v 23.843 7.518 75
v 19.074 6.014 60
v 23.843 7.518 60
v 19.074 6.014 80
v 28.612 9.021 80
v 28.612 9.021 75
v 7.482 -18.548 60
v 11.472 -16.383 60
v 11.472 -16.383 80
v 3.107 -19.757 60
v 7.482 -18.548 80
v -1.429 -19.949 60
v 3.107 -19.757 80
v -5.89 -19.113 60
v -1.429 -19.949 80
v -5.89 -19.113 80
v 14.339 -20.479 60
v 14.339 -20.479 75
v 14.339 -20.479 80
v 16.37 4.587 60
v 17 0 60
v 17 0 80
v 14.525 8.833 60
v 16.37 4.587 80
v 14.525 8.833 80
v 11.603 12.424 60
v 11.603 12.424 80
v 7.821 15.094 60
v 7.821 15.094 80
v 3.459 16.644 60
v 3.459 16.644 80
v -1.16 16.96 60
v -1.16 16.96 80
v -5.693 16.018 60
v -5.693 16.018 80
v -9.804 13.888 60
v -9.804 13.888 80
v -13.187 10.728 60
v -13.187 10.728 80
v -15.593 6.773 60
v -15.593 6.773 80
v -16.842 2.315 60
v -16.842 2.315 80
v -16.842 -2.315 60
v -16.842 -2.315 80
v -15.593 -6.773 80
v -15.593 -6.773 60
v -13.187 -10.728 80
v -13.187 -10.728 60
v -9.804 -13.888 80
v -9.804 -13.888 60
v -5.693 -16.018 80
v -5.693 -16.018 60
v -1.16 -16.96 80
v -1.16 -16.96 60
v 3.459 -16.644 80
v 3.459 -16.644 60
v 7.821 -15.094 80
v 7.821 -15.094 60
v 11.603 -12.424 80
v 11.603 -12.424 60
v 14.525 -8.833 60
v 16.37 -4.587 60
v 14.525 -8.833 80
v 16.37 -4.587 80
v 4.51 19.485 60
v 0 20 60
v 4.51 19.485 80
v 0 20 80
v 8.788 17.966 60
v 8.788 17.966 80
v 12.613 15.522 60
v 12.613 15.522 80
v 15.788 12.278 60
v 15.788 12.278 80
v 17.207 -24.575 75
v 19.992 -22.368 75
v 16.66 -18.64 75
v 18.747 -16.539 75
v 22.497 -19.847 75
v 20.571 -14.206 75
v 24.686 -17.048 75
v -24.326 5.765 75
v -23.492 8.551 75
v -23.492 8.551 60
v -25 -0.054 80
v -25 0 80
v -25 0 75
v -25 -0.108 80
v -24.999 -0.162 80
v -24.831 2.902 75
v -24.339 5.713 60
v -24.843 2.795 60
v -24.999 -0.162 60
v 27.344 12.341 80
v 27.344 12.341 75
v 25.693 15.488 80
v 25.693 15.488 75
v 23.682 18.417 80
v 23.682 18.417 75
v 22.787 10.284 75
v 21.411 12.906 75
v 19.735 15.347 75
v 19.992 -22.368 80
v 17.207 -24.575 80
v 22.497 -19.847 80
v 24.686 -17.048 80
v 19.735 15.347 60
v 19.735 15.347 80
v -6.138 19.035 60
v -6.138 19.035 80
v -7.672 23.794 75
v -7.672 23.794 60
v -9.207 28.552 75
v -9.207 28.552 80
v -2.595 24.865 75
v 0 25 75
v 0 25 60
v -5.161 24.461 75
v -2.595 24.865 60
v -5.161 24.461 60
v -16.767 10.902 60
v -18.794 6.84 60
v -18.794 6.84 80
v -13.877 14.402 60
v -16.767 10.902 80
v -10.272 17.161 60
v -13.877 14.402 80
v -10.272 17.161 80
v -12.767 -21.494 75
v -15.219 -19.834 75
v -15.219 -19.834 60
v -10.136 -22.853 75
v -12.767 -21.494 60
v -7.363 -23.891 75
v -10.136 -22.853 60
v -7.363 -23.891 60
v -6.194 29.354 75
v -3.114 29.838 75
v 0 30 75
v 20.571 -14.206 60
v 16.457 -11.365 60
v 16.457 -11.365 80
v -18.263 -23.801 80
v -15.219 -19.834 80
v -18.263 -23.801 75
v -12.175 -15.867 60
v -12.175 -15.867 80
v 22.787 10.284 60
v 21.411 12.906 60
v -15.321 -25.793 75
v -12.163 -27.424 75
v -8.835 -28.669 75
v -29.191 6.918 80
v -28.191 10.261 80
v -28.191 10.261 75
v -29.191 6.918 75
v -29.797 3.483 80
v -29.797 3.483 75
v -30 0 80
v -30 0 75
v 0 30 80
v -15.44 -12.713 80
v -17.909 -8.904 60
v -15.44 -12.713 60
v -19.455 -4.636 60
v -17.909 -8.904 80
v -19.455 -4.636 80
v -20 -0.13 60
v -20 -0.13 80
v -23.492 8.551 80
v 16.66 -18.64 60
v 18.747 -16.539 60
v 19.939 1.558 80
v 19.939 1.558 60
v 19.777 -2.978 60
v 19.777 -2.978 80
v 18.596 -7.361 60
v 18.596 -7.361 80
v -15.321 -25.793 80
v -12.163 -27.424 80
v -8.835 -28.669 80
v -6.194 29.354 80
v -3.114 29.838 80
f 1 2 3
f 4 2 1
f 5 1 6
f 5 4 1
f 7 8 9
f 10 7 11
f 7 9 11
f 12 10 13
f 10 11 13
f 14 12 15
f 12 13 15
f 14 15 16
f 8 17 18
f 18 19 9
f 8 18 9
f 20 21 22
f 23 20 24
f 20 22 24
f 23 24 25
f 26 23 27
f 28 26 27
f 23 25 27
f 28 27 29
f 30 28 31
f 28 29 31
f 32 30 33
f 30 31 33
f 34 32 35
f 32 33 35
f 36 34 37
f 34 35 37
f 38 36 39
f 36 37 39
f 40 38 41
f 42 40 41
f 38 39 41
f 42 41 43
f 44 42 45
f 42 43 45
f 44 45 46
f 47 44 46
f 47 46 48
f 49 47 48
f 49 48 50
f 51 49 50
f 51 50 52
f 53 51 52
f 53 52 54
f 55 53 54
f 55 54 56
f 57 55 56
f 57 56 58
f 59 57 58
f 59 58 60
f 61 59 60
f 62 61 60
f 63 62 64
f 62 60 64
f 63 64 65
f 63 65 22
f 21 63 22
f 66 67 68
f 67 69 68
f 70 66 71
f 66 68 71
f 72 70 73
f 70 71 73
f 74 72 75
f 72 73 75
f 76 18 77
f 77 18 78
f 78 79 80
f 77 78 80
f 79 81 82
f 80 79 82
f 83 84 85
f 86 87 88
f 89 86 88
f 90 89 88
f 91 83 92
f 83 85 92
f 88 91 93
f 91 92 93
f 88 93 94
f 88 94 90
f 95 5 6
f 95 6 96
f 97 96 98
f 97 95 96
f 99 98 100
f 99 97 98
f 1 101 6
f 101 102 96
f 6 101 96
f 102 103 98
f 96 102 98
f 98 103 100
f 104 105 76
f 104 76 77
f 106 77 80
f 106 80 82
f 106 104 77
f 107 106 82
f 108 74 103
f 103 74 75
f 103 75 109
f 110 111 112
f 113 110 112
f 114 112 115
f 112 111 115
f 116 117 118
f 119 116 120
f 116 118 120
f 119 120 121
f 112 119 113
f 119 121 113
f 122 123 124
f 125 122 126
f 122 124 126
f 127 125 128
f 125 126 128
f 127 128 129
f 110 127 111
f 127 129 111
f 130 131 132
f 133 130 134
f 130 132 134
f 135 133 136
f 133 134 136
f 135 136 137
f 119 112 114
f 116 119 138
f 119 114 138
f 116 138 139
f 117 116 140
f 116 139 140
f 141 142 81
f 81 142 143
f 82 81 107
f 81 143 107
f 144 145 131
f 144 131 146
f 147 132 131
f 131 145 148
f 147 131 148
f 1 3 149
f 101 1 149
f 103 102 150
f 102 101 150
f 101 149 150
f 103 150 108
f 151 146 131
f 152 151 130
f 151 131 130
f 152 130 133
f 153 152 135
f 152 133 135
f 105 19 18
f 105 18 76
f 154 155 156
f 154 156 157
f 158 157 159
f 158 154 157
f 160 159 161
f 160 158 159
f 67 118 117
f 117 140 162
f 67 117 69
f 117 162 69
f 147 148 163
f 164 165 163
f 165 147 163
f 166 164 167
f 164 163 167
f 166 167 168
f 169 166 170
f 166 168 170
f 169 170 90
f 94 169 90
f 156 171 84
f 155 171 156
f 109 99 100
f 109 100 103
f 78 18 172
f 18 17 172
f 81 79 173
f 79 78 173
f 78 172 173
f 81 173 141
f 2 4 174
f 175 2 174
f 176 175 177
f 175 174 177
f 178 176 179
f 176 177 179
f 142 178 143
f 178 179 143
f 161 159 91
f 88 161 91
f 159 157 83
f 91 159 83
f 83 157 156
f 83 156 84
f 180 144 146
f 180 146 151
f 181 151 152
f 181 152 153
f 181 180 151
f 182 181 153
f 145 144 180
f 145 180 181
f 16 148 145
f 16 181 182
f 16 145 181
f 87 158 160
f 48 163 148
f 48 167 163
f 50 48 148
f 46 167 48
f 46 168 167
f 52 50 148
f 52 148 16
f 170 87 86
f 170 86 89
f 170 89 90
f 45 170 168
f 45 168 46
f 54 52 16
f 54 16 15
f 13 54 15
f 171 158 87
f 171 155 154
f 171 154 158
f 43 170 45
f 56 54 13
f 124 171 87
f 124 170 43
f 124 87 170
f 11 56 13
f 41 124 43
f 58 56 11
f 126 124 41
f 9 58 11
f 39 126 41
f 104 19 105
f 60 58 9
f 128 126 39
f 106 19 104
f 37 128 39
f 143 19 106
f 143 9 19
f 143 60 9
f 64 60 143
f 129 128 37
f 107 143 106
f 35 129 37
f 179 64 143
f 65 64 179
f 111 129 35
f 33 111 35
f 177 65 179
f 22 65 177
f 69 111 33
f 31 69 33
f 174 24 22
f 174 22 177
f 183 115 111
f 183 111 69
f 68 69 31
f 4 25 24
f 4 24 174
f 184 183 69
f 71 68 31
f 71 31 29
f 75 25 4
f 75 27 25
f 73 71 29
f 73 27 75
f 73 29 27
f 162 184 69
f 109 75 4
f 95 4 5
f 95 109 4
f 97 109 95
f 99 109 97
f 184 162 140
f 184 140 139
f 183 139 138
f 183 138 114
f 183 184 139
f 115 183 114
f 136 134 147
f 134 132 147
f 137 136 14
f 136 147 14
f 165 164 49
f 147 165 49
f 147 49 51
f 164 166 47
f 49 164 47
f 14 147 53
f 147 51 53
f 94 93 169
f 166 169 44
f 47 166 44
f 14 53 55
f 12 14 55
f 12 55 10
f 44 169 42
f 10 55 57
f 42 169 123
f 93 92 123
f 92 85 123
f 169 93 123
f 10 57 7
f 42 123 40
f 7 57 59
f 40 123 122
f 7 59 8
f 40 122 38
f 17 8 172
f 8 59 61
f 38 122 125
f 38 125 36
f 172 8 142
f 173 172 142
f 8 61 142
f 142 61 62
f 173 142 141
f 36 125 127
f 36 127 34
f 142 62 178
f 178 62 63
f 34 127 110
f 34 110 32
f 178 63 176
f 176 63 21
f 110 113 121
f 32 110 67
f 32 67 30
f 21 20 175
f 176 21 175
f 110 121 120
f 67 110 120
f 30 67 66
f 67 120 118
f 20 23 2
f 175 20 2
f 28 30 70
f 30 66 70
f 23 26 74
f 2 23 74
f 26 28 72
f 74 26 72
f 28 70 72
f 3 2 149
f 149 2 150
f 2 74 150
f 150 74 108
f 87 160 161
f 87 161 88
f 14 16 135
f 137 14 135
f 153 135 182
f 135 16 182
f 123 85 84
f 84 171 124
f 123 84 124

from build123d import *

# Parameters (mm, degrees)
F0_R     = 25
F0_R_2   = 15
F1_DEPTH = 80
F3_DEPTH = 80.001
F5_DEPTH = 5
F6_W     = 105.9157028794
F6_H     = 79.6656981111
F7_DEPTH = 60
F8_R     = 17
F9_DEPTH = 20.001


with BuildPart() as f1:
    # F0 (on Top) → F1 (new body)
    with BuildSketch(Plane.XY):
        Circle(F0_R)
        Circle(F0_R_2, mode=Mode.SUBTRACT)
    extrude(amount=F1_DEPTH)

    # F2 (on face) → F3 (cut, through all)
    with BuildSketch(Plane.XY.offset(80)):
        with BuildLine():
            Line((0, 25), (0, 20))
            ThreePointArc((0, 20), (8.7875598508, 17.9660455267), (15.7877700348, 12.2778791869))
            Line((15.7877700348, 12.2778791869), (19.7347125435, 15.3473489836))
            ThreePointArc((19.7347125435, 15.3473489836), (10.9844498135, 22.4575569084), (0, 25))
        make_face()
        with BuildLine():
            Line((-6.1376971007, 19.0349329996), (-7.6721213759, 23.7936662495))
            ThreePointArc((-7.6721213759, 23.7936662495), (-17.3462974082, 18.0029432657), (-23.4923155196, 8.5505035831))
            Line((-23.4923155196, 8.5505035831), (-18.7938524157, 6.8404028665))
            ThreePointArc((-18.7938524157, 6.8404028665), (-13.8770379265, 14.4023546125), (-6.1376971007, 19.0349329996))
        make_face()
        with BuildLine():
            Line((-19.9995793719, -0.1297110174), (-24.9994742148, -0.1621387717))
            ThreePointArc((-24.9994742148, -0.1621387717), (-22.3858443864, -11.1298684228), (-15.2190357252, -19.8338335073))
            Line((-15.2190357252, -19.8338335073), (-12.1752285802, -15.8670668058))
            ThreePointArc((-12.1752285802, -15.8670668058), (-17.9086755091, -8.9038947382), (-19.9995793719, -0.1297110174))
        make_face()
        with BuildLine():
            ThreePointArc((-7.362852386, -23.8911783875), (3.8831909406, -24.6965752306), (14.3394109088, -20.4788011072))
            Line((14.3394109088, -20.4788011072), (11.471528727, -16.3830408858))
            ThreePointArc((11.471528727, -16.3830408858), (3.1065527525, -19.7572601845), (-5.8902819088, -19.11294271))
            Line((-5.8902819088, -19.11294271), (-7.362852386, -23.8911783875))
        make_face()
        with BuildLine():
            ThreePointArc((25, 0), (24.7090377617, 3.8030846547), (23.8429237687, 7.5176449876))
            Line((23.8429237687, 7.5176449876), (19.074339015, 6.0141159901))
            ThreePointArc((19.074339015, 6.0141159901), (19.7769923674, -2.9783507013), (16.4570955105, -11.3650344196))
            Line((16.4570955105, -11.3650344196), (20.5713693881, -14.2062930245))
            ThreePointArc((20.5713693881, -14.2062930245), (23.8671765685, -7.4402878068), (25, 0))
        make_face()
    extrude(amount=-F3_DEPTH, mode=Mode.SUBTRACT)

    # F4 (on face) → F5 (join)
    with BuildSketch(Plane.XY.offset(80)):
        with BuildLine():
            ThreePointArc((19.7347125435, 15.3473489836), (22.1377203615, 11.6155644372), (23.8429237687, 7.5176449876))
            Line((23.8429237687, 7.5176449876), (28.6115085224, 9.0211739851))
            ThreePointArc((28.6115085224, 9.0211739851), (26.5652644339, 13.9386773246), (23.6816550522, 18.4168187804))
            Line((23.6816550522, 18.4168187804), (19.7347125435, 15.3473489836))
        make_face()
        with BuildLine():
            ThreePointArc((-7.6721213759, 23.7936662495), (-3.8831909406, 24.6965752306), (0, 25))
            Line((0, 25), (0, 30))
            ThreePointArc((0, 30), (-4.6598291287, 29.6358902767), (-9.2065456511, 28.5523994994))
            Line((-9.2065456511, 28.5523994994), (-7.6721213759, 23.7936662495))
        make_face()
        with BuildLine():
            ThreePointArc((-25, 0), (-24.6201938253, 4.3412044417), (-23.4923155196, 8.5505035831))
            Line((-23.4923155196, 8.5505035831), (-28.1907786236, 10.2606042998))
            ThreePointArc((-28.1907786236, 10.2606042998), (-29.5442325904, 5.20944533), (-30, 0))
            Line((-30, 0), (-25, 0))
        make_face()
        with BuildLine():
            Line((-8.8354228632, -28.669414065), (-7.362852386, -23.8911783875))
            ThreePointArc((-7.362852386, -23.8911783875), (-11.471744834, -22.2125881082), (-15.2190357252, -19.8338335073))
            Line((-15.2190357252, -19.8338335073), (-18.2628428703, -23.8006002087))
            ThreePointArc((-18.2628428703, -23.8006002087), (-13.7660938008, -26.6551057298), (-8.8354228632, -28.669414065))
        make_face()
        with BuildLine():
            Line((24.6856432657, -17.0475516294), (20.5713693881, -14.2062930245))
            ThreePointArc((20.5713693881, -14.2062930245), (17.7349015968, -17.620251569), (14.3394109088, -20.4788011072))
            Line((14.3394109088, -20.4788011072), (17.2072930905, -24.5745613287))
            ThreePointArc((17.2072930905, -24.5745613287), (21.2818819161, -21.1443018827), (24.6856432657, -17.0475516294))
        make_face()
        with BuildLine():
            Line((-4.6032728256, 14.2761997497), (-6.1376971007, 19.0349329996))
            ThreePointArc((-6.1376971007, 19.0349329996), (-13.8770379265, 14.4023546125), (-18.7938524157, 6.8404028665))
            Line((-18.7938524157, 6.8404028665), (-14.0953893118, 5.1303021499))
            ThreePointArc((-14.0953893118, 5.1303021499), (-10.4077784449, 10.8017659594), (-4.6032728256, 14.2761997497))
        make_face()
        with BuildLine():
            Line((11.8408275261, 9.2084093902), (15.7877700348, 12.2778791869))
            ThreePointArc((15.7877700348, 12.2778791869), (8.7875598508, 17.9660455267), (0, 20))
            Line((0, 20), (0, 15))
            ThreePointArc((0, 15), (6.5906698881, 13.4745341451), (11.8408275261, 9.2084093902))
        make_face()
        with BuildLine():
            ThreePointArc((16.4570955105, -11.3650344196), (19.7769923674, -2.9783507013), (19.074339015, 6.0141159901))
            Line((19.074339015, 6.0141159901), (14.3057542612, 4.5105869926))
            ThreePointArc((14.3057542612, 4.5105869926), (14.825422657, 2.2818507928), (15, 0))
            ThreePointArc((15, 0), (14.3203059411, -4.4641726841), (12.3428216329, -8.5237758147))
            Line((12.3428216329, -8.5237758147), (16.4570955105, -11.3650344196))
        make_face()
        with BuildLine():
            ThreePointArc((-5.8902819088, -19.11294271), (3.1065527525, -19.7572601845), (11.471528727, -16.3830408858))
            Line((11.471528727, -16.3830408858), (8.6036465453, -12.2872806643))
            ThreePointArc((8.6036465453, -12.2872806643), (2.3299145644, -14.8179451383), (-4.4177114316, -14.3347070325))
            Line((-4.4177114316, -14.3347070325), (-5.8902819088, -19.11294271))
        make_face()
    extrude(amount=-F5_DEPTH)

    # F6 (on Top) → F7 (cut)
    with BuildSketch(Plane.XY):
        with Locations((1.6787797213, 0.4578493536)):
            Rectangle(F6_W, F6_H)
    extrude(amount=F7_DEPTH, mode=Mode.SUBTRACT)

    # F8 (on face) → F9 (cut, through all)
    with BuildSketch(Plane.XY.offset(80)):
        Circle(F8_R)
    extrude(amount=-F9_DEPTH, mode=Mode.SUBTRACT)


solid = f1.part
